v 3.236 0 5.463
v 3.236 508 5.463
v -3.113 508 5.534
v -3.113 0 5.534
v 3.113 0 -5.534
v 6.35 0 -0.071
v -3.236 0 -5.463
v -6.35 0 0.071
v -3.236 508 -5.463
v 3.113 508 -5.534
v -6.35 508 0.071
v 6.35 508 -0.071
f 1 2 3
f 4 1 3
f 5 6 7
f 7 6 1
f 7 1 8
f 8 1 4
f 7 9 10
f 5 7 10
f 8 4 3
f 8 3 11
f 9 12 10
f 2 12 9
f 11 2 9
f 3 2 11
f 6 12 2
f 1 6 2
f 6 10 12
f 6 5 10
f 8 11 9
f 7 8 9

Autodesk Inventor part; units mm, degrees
ref_plane "YZ Plane" through (0, 0, 0) normal (1, 0, 0) x (0, 1, 0)
ref_plane "XZ Plane" through (0, 0, 0) normal (0, 1, 0) x (-1, 0, 0)
ref_plane "XY Plane" through (0, 0, 0) normal (0, 0, 1) x (1, 0, 0)
sketch "Sketch1" plane through (0, 0, 0) normal (0, 1, 0) x (-1, 0, 0)
  circle A0 centre (0, 0) radius 6.35
  line L0 (3.1132, 5.5345) -> (6.3496, 0.0712)
  line L1 (6.3496, 0.0712) -> (3.2364, -5.4633)
  line L2 (3.2364, -5.4633) -> (-3.1132, -5.5345)
  line L3 (-3.1132, -5.5345) -> (-6.3496, -0.0712)
  line L4 (-6.3496, -0.0712) -> (-3.2364, 5.4633)
  line L5 (-3.2364, 5.4633) -> (3.1132, 5.5345)
  dimension "d0" = 12.7
extrude "Extrusion1" add sketch "Sketch1" along normal blind 508 contours L1 L2 L3 L4 L5 L0
properties part number "SuperHexagon"
